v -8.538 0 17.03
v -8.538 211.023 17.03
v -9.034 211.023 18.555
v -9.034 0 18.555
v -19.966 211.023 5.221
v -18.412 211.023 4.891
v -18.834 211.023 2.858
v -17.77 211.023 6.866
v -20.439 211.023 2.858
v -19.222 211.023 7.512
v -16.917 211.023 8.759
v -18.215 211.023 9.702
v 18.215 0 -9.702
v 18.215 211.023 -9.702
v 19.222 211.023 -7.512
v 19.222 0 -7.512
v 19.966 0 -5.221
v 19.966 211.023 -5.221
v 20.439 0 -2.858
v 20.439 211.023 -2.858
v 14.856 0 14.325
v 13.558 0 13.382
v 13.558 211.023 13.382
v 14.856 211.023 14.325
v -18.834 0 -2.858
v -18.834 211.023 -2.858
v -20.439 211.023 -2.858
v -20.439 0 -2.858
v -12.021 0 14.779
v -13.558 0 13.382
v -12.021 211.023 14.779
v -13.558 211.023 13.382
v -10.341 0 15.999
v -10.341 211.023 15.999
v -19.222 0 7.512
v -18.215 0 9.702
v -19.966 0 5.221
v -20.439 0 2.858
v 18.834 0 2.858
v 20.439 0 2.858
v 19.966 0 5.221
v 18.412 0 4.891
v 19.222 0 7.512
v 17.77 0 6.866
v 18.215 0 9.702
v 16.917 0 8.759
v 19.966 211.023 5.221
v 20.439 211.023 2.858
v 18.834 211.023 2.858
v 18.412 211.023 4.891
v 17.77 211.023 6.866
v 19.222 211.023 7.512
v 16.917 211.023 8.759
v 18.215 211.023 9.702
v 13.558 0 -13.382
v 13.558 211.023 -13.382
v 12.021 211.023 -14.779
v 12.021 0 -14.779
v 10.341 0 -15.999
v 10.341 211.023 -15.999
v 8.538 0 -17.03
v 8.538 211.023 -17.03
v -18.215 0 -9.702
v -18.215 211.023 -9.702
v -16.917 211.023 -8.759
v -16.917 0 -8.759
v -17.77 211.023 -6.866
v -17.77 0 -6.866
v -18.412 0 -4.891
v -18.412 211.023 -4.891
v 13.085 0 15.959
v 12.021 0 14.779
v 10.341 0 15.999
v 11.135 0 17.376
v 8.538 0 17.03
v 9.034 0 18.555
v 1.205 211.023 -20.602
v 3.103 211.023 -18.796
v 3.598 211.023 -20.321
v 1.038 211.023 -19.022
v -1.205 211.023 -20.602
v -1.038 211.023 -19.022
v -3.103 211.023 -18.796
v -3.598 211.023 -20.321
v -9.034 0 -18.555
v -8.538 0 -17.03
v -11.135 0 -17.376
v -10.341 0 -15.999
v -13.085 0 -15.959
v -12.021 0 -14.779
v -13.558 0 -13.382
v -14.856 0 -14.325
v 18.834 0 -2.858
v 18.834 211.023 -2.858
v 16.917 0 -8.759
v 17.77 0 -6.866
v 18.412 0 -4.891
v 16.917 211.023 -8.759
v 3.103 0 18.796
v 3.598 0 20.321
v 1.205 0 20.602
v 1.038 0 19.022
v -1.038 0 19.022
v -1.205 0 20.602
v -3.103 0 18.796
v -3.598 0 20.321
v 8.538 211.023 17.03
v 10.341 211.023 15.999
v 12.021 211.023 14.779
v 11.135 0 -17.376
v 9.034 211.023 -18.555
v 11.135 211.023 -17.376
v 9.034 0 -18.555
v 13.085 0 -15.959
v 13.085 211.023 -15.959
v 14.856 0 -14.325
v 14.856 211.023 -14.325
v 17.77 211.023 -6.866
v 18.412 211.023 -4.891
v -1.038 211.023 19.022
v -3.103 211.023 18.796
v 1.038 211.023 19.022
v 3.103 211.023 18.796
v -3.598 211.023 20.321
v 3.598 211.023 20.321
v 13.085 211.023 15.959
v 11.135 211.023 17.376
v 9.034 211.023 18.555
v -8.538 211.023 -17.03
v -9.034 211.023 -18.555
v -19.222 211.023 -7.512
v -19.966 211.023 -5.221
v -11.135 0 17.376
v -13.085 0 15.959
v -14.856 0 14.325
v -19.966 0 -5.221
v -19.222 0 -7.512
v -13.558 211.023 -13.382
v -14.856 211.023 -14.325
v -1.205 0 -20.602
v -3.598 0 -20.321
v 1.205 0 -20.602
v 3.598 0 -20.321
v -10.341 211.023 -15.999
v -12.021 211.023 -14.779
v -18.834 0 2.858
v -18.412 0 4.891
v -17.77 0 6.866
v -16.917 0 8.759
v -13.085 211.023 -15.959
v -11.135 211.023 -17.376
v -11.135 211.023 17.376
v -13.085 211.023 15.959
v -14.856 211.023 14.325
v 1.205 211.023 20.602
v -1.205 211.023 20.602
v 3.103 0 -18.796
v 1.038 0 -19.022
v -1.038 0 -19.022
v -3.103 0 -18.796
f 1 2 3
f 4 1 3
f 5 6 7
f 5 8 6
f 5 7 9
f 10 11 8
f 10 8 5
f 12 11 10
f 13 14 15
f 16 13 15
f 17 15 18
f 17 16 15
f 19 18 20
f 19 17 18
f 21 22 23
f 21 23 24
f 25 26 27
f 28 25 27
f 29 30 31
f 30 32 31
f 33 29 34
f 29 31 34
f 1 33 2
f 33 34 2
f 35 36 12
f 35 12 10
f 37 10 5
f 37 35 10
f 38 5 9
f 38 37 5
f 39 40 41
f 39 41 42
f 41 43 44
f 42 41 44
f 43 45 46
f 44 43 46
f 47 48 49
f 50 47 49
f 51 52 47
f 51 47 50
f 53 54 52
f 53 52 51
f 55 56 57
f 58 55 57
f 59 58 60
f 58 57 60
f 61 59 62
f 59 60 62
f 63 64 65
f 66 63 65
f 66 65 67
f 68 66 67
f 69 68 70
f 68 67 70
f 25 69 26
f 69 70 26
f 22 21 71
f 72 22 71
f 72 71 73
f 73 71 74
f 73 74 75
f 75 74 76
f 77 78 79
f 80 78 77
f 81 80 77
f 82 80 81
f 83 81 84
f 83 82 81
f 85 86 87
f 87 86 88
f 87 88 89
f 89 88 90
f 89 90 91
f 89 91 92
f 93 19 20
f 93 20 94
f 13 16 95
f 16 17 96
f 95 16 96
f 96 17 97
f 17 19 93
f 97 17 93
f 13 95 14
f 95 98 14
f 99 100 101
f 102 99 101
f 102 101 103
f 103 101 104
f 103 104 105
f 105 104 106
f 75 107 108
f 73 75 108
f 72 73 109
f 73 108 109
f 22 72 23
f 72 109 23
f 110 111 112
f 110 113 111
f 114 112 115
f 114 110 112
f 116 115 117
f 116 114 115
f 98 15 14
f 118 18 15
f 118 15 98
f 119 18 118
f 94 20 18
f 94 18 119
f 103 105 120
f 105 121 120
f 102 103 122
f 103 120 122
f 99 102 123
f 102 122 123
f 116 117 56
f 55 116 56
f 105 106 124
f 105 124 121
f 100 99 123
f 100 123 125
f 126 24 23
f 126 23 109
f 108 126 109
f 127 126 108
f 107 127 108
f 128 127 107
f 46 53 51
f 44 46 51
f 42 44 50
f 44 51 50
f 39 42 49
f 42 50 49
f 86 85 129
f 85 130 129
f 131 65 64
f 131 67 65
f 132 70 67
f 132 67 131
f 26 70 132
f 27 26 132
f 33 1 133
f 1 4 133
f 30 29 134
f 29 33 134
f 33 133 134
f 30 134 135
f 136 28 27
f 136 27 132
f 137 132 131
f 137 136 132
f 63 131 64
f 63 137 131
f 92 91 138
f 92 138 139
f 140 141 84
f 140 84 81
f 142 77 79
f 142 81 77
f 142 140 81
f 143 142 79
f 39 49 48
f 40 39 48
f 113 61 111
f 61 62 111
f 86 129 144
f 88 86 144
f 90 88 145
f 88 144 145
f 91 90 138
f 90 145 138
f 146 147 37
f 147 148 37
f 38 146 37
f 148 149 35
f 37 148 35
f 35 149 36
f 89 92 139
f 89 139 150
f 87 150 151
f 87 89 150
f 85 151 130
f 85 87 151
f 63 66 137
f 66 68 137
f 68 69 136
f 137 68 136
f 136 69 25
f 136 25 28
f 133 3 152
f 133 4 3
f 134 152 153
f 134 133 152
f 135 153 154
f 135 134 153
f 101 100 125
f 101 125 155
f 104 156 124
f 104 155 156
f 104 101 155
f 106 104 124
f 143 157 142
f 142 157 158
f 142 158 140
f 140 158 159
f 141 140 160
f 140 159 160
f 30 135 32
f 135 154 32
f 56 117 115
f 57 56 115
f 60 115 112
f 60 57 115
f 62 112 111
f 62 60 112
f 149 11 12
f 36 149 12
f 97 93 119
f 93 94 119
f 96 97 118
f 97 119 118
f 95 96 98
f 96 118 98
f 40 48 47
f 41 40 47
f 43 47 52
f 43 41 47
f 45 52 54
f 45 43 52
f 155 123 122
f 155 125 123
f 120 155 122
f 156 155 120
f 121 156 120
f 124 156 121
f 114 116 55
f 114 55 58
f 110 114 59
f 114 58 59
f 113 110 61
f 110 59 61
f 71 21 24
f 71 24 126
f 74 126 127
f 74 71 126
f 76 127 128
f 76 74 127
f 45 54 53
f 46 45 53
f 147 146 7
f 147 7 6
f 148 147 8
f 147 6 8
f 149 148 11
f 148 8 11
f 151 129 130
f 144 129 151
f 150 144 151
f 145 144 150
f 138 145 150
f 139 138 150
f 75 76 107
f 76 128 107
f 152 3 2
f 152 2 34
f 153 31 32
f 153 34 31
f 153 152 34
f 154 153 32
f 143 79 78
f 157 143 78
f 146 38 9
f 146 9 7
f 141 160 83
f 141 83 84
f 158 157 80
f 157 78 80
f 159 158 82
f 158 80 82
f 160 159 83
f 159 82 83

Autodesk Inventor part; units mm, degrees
ref_plane "YZ Plane" through (0, 0, 0) normal (1, 0, 0) x (0, 1, 0)
ref_plane "XZ Plane" through (0, 0, 0) normal (0, 1, 0) x (-1, 0, 0)
ref_plane "XY Plane" through (0, 0, 0) normal (0, 0, 1) x (1, 0, 0)
sketch "Sketch1" plane through (0, 0, 0) normal (0, 1, 0) x (-1, 0, 0)
  circle A0 centre (0, 0) radius 20.6375
  dimension "d0" = 41.275
extrude "Extrusion1" add sketch "Sketch1" along normal blind 211.0232
sketch "Sketch2" plane through (0, 211.0232, 0) normal (0, 1, 0) x (1, 0, 0)
  circle A0 centre (0, 0) radius 19.05
  dimension "d3" = 38.1
extrude "Extrusion2" cut sketch "Sketch2" against normal through all
sketch "Sketch3" plane through (0, 211.0232, 0) normal (0, 1, 0) x (1, 0, 0)
  line L0 (-25.4, -2.8575) -> (-12.7, -2.8575)
  line L1 (-12.7, -2.8575) -> (-12.7, 2.8575)
  line L2 (-12.7, 2.8575) -> (-25.4, 2.8575)
  line L3 (-25.4, 2.8575) -> (-25.4, -2.8575)
  line L4 (-18.8694, -17.2415) -> (-8.5949, -9.7766)
  line L5 (-8.5949, -9.7766) -> (-11.9541, -5.1531)
  line L6 (-11.9541, -5.1531) -> (-22.2286, -12.618)
  line L7 (-22.2286, -12.618) -> (-18.8694, -17.2415)
  line L8 (-5.1314, -25.0399) -> (-1.2069, -12.9614)
  line L9 (-1.2069, -12.9614) -> (-6.6422, -11.1954)
  line L10 (-6.6422, -11.1954) -> (-10.5667, -23.2738)
  line L11 (-10.5667, -23.2738) -> (-5.1314, -25.0399)
  line L12 (10.5667, -23.2738) -> (6.6422, -11.1954)
  line L13 (6.6422, -11.1954) -> (1.2069, -12.9614)
  line L14 (1.2069, -12.9614) -> (5.1314, -25.0399)
  line L15 (5.1314, -25.0399) -> (10.5667, -23.2738)
  line L16 (22.2286, -12.618) -> (11.9541, -5.1531)
  line L17 (11.9541, -5.1531) -> (8.5949, -9.7766)
  line L18 (8.5949, -9.7766) -> (18.8694, -17.2415)
  line L19 (18.8694, -17.2415) -> (22.2286, -12.618)
  line L20 (25.4, 2.8575) -> (12.7, 2.8575)
  line L21 (12.7, 2.8575) -> (12.7, -2.8575)
  line L22 (12.7, -2.8575) -> (25.4, -2.8575)
  line L23 (25.4, -2.8575) -> (25.4, 2.8575)
  line L24 (18.8694, 17.2415) -> (8.5949, 9.7766)
  line L25 (8.5949, 9.7766) -> (11.9541, 5.1531)
  line L26 (11.9541, 5.1531) -> (22.2286, 12.618)
  line L27 (22.2286, 12.618) -> (18.8694, 17.2415)
  line L28 (5.1314, 25.0399) -> (1.2069, 12.9614)
  line L29 (1.2069, 12.9614) -> (6.6422, 11.1954)
  line L30 (6.6422, 11.1954) -> (10.5667, 23.2738)
  line L31 (10.5667, 23.2738) -> (5.1314, 25.0399)
  circle A0 centre (0, 0) radius 20.6375 projected
  line L32 (-10.5667, 23.2738) -> (-6.6422, 11.1954)
  line L33 (-6.6422, 11.1954) -> (-1.2069, 12.9614)
  line L34 (-1.2069, 12.9614) -> (-5.1314, 25.0399)
  line L35 (-5.1314, 25.0399) -> (-10.5667, 23.2738)
  line L36 (-22.2286, 12.618) -> (-11.9541, 5.1531)
  line L37 (-11.9541, 5.1531) -> (-8.5949, 9.7766)
  line L38 (-8.5949, 9.7766) -> (-18.8694, 17.2415)
  line L39 (-18.8694, 17.2415) -> (-22.2286, 12.618)
  point P0 (-30.1625, 0)
  point P1 (-24.402, -17.7291)
  point P2 (-9.3207, -28.6862)
  point P3 (9.3207, -28.6862)
  point P4 (24.402, -17.7291)
  point P5 (30.1625, 0)
  point P6 (24.402, 17.7291)
  point P7 (9.3207, 28.6862)
  point P8 (-9.3207, 28.6862)
  point P9 (-24.402, 17.7291)
  dimension "d13" = 360
  dimension "d16" = 12.7
extrude "Extrusion3" cut sketch "Sketch3" against normal through all contours L3 L2 A0 L0 | A0 L2 L1 L0 | A0 L4 L7 L6 | L6 L5 L4 A0 | L36 L39 L38 A0 | A0 L38 L37 L36 | A0 L8 L11 L10 | L10 L9 L8 A0 | L32 L35 L34 A0 | A0 L34 L33 L32 | A0 L12 L15 L14 | L14 L13 L12 A0 | A0 L30 L29 L28 | L28 L31 L30 A0 | A0 L16 L19 L18 | L18 L17 L16 A0 | A0 L26 L25 L24 | L24 L27 L26 A0 | A0 L20 L23 L22 | L22 L21 L20 A0
properties part number "bandstoproller"
